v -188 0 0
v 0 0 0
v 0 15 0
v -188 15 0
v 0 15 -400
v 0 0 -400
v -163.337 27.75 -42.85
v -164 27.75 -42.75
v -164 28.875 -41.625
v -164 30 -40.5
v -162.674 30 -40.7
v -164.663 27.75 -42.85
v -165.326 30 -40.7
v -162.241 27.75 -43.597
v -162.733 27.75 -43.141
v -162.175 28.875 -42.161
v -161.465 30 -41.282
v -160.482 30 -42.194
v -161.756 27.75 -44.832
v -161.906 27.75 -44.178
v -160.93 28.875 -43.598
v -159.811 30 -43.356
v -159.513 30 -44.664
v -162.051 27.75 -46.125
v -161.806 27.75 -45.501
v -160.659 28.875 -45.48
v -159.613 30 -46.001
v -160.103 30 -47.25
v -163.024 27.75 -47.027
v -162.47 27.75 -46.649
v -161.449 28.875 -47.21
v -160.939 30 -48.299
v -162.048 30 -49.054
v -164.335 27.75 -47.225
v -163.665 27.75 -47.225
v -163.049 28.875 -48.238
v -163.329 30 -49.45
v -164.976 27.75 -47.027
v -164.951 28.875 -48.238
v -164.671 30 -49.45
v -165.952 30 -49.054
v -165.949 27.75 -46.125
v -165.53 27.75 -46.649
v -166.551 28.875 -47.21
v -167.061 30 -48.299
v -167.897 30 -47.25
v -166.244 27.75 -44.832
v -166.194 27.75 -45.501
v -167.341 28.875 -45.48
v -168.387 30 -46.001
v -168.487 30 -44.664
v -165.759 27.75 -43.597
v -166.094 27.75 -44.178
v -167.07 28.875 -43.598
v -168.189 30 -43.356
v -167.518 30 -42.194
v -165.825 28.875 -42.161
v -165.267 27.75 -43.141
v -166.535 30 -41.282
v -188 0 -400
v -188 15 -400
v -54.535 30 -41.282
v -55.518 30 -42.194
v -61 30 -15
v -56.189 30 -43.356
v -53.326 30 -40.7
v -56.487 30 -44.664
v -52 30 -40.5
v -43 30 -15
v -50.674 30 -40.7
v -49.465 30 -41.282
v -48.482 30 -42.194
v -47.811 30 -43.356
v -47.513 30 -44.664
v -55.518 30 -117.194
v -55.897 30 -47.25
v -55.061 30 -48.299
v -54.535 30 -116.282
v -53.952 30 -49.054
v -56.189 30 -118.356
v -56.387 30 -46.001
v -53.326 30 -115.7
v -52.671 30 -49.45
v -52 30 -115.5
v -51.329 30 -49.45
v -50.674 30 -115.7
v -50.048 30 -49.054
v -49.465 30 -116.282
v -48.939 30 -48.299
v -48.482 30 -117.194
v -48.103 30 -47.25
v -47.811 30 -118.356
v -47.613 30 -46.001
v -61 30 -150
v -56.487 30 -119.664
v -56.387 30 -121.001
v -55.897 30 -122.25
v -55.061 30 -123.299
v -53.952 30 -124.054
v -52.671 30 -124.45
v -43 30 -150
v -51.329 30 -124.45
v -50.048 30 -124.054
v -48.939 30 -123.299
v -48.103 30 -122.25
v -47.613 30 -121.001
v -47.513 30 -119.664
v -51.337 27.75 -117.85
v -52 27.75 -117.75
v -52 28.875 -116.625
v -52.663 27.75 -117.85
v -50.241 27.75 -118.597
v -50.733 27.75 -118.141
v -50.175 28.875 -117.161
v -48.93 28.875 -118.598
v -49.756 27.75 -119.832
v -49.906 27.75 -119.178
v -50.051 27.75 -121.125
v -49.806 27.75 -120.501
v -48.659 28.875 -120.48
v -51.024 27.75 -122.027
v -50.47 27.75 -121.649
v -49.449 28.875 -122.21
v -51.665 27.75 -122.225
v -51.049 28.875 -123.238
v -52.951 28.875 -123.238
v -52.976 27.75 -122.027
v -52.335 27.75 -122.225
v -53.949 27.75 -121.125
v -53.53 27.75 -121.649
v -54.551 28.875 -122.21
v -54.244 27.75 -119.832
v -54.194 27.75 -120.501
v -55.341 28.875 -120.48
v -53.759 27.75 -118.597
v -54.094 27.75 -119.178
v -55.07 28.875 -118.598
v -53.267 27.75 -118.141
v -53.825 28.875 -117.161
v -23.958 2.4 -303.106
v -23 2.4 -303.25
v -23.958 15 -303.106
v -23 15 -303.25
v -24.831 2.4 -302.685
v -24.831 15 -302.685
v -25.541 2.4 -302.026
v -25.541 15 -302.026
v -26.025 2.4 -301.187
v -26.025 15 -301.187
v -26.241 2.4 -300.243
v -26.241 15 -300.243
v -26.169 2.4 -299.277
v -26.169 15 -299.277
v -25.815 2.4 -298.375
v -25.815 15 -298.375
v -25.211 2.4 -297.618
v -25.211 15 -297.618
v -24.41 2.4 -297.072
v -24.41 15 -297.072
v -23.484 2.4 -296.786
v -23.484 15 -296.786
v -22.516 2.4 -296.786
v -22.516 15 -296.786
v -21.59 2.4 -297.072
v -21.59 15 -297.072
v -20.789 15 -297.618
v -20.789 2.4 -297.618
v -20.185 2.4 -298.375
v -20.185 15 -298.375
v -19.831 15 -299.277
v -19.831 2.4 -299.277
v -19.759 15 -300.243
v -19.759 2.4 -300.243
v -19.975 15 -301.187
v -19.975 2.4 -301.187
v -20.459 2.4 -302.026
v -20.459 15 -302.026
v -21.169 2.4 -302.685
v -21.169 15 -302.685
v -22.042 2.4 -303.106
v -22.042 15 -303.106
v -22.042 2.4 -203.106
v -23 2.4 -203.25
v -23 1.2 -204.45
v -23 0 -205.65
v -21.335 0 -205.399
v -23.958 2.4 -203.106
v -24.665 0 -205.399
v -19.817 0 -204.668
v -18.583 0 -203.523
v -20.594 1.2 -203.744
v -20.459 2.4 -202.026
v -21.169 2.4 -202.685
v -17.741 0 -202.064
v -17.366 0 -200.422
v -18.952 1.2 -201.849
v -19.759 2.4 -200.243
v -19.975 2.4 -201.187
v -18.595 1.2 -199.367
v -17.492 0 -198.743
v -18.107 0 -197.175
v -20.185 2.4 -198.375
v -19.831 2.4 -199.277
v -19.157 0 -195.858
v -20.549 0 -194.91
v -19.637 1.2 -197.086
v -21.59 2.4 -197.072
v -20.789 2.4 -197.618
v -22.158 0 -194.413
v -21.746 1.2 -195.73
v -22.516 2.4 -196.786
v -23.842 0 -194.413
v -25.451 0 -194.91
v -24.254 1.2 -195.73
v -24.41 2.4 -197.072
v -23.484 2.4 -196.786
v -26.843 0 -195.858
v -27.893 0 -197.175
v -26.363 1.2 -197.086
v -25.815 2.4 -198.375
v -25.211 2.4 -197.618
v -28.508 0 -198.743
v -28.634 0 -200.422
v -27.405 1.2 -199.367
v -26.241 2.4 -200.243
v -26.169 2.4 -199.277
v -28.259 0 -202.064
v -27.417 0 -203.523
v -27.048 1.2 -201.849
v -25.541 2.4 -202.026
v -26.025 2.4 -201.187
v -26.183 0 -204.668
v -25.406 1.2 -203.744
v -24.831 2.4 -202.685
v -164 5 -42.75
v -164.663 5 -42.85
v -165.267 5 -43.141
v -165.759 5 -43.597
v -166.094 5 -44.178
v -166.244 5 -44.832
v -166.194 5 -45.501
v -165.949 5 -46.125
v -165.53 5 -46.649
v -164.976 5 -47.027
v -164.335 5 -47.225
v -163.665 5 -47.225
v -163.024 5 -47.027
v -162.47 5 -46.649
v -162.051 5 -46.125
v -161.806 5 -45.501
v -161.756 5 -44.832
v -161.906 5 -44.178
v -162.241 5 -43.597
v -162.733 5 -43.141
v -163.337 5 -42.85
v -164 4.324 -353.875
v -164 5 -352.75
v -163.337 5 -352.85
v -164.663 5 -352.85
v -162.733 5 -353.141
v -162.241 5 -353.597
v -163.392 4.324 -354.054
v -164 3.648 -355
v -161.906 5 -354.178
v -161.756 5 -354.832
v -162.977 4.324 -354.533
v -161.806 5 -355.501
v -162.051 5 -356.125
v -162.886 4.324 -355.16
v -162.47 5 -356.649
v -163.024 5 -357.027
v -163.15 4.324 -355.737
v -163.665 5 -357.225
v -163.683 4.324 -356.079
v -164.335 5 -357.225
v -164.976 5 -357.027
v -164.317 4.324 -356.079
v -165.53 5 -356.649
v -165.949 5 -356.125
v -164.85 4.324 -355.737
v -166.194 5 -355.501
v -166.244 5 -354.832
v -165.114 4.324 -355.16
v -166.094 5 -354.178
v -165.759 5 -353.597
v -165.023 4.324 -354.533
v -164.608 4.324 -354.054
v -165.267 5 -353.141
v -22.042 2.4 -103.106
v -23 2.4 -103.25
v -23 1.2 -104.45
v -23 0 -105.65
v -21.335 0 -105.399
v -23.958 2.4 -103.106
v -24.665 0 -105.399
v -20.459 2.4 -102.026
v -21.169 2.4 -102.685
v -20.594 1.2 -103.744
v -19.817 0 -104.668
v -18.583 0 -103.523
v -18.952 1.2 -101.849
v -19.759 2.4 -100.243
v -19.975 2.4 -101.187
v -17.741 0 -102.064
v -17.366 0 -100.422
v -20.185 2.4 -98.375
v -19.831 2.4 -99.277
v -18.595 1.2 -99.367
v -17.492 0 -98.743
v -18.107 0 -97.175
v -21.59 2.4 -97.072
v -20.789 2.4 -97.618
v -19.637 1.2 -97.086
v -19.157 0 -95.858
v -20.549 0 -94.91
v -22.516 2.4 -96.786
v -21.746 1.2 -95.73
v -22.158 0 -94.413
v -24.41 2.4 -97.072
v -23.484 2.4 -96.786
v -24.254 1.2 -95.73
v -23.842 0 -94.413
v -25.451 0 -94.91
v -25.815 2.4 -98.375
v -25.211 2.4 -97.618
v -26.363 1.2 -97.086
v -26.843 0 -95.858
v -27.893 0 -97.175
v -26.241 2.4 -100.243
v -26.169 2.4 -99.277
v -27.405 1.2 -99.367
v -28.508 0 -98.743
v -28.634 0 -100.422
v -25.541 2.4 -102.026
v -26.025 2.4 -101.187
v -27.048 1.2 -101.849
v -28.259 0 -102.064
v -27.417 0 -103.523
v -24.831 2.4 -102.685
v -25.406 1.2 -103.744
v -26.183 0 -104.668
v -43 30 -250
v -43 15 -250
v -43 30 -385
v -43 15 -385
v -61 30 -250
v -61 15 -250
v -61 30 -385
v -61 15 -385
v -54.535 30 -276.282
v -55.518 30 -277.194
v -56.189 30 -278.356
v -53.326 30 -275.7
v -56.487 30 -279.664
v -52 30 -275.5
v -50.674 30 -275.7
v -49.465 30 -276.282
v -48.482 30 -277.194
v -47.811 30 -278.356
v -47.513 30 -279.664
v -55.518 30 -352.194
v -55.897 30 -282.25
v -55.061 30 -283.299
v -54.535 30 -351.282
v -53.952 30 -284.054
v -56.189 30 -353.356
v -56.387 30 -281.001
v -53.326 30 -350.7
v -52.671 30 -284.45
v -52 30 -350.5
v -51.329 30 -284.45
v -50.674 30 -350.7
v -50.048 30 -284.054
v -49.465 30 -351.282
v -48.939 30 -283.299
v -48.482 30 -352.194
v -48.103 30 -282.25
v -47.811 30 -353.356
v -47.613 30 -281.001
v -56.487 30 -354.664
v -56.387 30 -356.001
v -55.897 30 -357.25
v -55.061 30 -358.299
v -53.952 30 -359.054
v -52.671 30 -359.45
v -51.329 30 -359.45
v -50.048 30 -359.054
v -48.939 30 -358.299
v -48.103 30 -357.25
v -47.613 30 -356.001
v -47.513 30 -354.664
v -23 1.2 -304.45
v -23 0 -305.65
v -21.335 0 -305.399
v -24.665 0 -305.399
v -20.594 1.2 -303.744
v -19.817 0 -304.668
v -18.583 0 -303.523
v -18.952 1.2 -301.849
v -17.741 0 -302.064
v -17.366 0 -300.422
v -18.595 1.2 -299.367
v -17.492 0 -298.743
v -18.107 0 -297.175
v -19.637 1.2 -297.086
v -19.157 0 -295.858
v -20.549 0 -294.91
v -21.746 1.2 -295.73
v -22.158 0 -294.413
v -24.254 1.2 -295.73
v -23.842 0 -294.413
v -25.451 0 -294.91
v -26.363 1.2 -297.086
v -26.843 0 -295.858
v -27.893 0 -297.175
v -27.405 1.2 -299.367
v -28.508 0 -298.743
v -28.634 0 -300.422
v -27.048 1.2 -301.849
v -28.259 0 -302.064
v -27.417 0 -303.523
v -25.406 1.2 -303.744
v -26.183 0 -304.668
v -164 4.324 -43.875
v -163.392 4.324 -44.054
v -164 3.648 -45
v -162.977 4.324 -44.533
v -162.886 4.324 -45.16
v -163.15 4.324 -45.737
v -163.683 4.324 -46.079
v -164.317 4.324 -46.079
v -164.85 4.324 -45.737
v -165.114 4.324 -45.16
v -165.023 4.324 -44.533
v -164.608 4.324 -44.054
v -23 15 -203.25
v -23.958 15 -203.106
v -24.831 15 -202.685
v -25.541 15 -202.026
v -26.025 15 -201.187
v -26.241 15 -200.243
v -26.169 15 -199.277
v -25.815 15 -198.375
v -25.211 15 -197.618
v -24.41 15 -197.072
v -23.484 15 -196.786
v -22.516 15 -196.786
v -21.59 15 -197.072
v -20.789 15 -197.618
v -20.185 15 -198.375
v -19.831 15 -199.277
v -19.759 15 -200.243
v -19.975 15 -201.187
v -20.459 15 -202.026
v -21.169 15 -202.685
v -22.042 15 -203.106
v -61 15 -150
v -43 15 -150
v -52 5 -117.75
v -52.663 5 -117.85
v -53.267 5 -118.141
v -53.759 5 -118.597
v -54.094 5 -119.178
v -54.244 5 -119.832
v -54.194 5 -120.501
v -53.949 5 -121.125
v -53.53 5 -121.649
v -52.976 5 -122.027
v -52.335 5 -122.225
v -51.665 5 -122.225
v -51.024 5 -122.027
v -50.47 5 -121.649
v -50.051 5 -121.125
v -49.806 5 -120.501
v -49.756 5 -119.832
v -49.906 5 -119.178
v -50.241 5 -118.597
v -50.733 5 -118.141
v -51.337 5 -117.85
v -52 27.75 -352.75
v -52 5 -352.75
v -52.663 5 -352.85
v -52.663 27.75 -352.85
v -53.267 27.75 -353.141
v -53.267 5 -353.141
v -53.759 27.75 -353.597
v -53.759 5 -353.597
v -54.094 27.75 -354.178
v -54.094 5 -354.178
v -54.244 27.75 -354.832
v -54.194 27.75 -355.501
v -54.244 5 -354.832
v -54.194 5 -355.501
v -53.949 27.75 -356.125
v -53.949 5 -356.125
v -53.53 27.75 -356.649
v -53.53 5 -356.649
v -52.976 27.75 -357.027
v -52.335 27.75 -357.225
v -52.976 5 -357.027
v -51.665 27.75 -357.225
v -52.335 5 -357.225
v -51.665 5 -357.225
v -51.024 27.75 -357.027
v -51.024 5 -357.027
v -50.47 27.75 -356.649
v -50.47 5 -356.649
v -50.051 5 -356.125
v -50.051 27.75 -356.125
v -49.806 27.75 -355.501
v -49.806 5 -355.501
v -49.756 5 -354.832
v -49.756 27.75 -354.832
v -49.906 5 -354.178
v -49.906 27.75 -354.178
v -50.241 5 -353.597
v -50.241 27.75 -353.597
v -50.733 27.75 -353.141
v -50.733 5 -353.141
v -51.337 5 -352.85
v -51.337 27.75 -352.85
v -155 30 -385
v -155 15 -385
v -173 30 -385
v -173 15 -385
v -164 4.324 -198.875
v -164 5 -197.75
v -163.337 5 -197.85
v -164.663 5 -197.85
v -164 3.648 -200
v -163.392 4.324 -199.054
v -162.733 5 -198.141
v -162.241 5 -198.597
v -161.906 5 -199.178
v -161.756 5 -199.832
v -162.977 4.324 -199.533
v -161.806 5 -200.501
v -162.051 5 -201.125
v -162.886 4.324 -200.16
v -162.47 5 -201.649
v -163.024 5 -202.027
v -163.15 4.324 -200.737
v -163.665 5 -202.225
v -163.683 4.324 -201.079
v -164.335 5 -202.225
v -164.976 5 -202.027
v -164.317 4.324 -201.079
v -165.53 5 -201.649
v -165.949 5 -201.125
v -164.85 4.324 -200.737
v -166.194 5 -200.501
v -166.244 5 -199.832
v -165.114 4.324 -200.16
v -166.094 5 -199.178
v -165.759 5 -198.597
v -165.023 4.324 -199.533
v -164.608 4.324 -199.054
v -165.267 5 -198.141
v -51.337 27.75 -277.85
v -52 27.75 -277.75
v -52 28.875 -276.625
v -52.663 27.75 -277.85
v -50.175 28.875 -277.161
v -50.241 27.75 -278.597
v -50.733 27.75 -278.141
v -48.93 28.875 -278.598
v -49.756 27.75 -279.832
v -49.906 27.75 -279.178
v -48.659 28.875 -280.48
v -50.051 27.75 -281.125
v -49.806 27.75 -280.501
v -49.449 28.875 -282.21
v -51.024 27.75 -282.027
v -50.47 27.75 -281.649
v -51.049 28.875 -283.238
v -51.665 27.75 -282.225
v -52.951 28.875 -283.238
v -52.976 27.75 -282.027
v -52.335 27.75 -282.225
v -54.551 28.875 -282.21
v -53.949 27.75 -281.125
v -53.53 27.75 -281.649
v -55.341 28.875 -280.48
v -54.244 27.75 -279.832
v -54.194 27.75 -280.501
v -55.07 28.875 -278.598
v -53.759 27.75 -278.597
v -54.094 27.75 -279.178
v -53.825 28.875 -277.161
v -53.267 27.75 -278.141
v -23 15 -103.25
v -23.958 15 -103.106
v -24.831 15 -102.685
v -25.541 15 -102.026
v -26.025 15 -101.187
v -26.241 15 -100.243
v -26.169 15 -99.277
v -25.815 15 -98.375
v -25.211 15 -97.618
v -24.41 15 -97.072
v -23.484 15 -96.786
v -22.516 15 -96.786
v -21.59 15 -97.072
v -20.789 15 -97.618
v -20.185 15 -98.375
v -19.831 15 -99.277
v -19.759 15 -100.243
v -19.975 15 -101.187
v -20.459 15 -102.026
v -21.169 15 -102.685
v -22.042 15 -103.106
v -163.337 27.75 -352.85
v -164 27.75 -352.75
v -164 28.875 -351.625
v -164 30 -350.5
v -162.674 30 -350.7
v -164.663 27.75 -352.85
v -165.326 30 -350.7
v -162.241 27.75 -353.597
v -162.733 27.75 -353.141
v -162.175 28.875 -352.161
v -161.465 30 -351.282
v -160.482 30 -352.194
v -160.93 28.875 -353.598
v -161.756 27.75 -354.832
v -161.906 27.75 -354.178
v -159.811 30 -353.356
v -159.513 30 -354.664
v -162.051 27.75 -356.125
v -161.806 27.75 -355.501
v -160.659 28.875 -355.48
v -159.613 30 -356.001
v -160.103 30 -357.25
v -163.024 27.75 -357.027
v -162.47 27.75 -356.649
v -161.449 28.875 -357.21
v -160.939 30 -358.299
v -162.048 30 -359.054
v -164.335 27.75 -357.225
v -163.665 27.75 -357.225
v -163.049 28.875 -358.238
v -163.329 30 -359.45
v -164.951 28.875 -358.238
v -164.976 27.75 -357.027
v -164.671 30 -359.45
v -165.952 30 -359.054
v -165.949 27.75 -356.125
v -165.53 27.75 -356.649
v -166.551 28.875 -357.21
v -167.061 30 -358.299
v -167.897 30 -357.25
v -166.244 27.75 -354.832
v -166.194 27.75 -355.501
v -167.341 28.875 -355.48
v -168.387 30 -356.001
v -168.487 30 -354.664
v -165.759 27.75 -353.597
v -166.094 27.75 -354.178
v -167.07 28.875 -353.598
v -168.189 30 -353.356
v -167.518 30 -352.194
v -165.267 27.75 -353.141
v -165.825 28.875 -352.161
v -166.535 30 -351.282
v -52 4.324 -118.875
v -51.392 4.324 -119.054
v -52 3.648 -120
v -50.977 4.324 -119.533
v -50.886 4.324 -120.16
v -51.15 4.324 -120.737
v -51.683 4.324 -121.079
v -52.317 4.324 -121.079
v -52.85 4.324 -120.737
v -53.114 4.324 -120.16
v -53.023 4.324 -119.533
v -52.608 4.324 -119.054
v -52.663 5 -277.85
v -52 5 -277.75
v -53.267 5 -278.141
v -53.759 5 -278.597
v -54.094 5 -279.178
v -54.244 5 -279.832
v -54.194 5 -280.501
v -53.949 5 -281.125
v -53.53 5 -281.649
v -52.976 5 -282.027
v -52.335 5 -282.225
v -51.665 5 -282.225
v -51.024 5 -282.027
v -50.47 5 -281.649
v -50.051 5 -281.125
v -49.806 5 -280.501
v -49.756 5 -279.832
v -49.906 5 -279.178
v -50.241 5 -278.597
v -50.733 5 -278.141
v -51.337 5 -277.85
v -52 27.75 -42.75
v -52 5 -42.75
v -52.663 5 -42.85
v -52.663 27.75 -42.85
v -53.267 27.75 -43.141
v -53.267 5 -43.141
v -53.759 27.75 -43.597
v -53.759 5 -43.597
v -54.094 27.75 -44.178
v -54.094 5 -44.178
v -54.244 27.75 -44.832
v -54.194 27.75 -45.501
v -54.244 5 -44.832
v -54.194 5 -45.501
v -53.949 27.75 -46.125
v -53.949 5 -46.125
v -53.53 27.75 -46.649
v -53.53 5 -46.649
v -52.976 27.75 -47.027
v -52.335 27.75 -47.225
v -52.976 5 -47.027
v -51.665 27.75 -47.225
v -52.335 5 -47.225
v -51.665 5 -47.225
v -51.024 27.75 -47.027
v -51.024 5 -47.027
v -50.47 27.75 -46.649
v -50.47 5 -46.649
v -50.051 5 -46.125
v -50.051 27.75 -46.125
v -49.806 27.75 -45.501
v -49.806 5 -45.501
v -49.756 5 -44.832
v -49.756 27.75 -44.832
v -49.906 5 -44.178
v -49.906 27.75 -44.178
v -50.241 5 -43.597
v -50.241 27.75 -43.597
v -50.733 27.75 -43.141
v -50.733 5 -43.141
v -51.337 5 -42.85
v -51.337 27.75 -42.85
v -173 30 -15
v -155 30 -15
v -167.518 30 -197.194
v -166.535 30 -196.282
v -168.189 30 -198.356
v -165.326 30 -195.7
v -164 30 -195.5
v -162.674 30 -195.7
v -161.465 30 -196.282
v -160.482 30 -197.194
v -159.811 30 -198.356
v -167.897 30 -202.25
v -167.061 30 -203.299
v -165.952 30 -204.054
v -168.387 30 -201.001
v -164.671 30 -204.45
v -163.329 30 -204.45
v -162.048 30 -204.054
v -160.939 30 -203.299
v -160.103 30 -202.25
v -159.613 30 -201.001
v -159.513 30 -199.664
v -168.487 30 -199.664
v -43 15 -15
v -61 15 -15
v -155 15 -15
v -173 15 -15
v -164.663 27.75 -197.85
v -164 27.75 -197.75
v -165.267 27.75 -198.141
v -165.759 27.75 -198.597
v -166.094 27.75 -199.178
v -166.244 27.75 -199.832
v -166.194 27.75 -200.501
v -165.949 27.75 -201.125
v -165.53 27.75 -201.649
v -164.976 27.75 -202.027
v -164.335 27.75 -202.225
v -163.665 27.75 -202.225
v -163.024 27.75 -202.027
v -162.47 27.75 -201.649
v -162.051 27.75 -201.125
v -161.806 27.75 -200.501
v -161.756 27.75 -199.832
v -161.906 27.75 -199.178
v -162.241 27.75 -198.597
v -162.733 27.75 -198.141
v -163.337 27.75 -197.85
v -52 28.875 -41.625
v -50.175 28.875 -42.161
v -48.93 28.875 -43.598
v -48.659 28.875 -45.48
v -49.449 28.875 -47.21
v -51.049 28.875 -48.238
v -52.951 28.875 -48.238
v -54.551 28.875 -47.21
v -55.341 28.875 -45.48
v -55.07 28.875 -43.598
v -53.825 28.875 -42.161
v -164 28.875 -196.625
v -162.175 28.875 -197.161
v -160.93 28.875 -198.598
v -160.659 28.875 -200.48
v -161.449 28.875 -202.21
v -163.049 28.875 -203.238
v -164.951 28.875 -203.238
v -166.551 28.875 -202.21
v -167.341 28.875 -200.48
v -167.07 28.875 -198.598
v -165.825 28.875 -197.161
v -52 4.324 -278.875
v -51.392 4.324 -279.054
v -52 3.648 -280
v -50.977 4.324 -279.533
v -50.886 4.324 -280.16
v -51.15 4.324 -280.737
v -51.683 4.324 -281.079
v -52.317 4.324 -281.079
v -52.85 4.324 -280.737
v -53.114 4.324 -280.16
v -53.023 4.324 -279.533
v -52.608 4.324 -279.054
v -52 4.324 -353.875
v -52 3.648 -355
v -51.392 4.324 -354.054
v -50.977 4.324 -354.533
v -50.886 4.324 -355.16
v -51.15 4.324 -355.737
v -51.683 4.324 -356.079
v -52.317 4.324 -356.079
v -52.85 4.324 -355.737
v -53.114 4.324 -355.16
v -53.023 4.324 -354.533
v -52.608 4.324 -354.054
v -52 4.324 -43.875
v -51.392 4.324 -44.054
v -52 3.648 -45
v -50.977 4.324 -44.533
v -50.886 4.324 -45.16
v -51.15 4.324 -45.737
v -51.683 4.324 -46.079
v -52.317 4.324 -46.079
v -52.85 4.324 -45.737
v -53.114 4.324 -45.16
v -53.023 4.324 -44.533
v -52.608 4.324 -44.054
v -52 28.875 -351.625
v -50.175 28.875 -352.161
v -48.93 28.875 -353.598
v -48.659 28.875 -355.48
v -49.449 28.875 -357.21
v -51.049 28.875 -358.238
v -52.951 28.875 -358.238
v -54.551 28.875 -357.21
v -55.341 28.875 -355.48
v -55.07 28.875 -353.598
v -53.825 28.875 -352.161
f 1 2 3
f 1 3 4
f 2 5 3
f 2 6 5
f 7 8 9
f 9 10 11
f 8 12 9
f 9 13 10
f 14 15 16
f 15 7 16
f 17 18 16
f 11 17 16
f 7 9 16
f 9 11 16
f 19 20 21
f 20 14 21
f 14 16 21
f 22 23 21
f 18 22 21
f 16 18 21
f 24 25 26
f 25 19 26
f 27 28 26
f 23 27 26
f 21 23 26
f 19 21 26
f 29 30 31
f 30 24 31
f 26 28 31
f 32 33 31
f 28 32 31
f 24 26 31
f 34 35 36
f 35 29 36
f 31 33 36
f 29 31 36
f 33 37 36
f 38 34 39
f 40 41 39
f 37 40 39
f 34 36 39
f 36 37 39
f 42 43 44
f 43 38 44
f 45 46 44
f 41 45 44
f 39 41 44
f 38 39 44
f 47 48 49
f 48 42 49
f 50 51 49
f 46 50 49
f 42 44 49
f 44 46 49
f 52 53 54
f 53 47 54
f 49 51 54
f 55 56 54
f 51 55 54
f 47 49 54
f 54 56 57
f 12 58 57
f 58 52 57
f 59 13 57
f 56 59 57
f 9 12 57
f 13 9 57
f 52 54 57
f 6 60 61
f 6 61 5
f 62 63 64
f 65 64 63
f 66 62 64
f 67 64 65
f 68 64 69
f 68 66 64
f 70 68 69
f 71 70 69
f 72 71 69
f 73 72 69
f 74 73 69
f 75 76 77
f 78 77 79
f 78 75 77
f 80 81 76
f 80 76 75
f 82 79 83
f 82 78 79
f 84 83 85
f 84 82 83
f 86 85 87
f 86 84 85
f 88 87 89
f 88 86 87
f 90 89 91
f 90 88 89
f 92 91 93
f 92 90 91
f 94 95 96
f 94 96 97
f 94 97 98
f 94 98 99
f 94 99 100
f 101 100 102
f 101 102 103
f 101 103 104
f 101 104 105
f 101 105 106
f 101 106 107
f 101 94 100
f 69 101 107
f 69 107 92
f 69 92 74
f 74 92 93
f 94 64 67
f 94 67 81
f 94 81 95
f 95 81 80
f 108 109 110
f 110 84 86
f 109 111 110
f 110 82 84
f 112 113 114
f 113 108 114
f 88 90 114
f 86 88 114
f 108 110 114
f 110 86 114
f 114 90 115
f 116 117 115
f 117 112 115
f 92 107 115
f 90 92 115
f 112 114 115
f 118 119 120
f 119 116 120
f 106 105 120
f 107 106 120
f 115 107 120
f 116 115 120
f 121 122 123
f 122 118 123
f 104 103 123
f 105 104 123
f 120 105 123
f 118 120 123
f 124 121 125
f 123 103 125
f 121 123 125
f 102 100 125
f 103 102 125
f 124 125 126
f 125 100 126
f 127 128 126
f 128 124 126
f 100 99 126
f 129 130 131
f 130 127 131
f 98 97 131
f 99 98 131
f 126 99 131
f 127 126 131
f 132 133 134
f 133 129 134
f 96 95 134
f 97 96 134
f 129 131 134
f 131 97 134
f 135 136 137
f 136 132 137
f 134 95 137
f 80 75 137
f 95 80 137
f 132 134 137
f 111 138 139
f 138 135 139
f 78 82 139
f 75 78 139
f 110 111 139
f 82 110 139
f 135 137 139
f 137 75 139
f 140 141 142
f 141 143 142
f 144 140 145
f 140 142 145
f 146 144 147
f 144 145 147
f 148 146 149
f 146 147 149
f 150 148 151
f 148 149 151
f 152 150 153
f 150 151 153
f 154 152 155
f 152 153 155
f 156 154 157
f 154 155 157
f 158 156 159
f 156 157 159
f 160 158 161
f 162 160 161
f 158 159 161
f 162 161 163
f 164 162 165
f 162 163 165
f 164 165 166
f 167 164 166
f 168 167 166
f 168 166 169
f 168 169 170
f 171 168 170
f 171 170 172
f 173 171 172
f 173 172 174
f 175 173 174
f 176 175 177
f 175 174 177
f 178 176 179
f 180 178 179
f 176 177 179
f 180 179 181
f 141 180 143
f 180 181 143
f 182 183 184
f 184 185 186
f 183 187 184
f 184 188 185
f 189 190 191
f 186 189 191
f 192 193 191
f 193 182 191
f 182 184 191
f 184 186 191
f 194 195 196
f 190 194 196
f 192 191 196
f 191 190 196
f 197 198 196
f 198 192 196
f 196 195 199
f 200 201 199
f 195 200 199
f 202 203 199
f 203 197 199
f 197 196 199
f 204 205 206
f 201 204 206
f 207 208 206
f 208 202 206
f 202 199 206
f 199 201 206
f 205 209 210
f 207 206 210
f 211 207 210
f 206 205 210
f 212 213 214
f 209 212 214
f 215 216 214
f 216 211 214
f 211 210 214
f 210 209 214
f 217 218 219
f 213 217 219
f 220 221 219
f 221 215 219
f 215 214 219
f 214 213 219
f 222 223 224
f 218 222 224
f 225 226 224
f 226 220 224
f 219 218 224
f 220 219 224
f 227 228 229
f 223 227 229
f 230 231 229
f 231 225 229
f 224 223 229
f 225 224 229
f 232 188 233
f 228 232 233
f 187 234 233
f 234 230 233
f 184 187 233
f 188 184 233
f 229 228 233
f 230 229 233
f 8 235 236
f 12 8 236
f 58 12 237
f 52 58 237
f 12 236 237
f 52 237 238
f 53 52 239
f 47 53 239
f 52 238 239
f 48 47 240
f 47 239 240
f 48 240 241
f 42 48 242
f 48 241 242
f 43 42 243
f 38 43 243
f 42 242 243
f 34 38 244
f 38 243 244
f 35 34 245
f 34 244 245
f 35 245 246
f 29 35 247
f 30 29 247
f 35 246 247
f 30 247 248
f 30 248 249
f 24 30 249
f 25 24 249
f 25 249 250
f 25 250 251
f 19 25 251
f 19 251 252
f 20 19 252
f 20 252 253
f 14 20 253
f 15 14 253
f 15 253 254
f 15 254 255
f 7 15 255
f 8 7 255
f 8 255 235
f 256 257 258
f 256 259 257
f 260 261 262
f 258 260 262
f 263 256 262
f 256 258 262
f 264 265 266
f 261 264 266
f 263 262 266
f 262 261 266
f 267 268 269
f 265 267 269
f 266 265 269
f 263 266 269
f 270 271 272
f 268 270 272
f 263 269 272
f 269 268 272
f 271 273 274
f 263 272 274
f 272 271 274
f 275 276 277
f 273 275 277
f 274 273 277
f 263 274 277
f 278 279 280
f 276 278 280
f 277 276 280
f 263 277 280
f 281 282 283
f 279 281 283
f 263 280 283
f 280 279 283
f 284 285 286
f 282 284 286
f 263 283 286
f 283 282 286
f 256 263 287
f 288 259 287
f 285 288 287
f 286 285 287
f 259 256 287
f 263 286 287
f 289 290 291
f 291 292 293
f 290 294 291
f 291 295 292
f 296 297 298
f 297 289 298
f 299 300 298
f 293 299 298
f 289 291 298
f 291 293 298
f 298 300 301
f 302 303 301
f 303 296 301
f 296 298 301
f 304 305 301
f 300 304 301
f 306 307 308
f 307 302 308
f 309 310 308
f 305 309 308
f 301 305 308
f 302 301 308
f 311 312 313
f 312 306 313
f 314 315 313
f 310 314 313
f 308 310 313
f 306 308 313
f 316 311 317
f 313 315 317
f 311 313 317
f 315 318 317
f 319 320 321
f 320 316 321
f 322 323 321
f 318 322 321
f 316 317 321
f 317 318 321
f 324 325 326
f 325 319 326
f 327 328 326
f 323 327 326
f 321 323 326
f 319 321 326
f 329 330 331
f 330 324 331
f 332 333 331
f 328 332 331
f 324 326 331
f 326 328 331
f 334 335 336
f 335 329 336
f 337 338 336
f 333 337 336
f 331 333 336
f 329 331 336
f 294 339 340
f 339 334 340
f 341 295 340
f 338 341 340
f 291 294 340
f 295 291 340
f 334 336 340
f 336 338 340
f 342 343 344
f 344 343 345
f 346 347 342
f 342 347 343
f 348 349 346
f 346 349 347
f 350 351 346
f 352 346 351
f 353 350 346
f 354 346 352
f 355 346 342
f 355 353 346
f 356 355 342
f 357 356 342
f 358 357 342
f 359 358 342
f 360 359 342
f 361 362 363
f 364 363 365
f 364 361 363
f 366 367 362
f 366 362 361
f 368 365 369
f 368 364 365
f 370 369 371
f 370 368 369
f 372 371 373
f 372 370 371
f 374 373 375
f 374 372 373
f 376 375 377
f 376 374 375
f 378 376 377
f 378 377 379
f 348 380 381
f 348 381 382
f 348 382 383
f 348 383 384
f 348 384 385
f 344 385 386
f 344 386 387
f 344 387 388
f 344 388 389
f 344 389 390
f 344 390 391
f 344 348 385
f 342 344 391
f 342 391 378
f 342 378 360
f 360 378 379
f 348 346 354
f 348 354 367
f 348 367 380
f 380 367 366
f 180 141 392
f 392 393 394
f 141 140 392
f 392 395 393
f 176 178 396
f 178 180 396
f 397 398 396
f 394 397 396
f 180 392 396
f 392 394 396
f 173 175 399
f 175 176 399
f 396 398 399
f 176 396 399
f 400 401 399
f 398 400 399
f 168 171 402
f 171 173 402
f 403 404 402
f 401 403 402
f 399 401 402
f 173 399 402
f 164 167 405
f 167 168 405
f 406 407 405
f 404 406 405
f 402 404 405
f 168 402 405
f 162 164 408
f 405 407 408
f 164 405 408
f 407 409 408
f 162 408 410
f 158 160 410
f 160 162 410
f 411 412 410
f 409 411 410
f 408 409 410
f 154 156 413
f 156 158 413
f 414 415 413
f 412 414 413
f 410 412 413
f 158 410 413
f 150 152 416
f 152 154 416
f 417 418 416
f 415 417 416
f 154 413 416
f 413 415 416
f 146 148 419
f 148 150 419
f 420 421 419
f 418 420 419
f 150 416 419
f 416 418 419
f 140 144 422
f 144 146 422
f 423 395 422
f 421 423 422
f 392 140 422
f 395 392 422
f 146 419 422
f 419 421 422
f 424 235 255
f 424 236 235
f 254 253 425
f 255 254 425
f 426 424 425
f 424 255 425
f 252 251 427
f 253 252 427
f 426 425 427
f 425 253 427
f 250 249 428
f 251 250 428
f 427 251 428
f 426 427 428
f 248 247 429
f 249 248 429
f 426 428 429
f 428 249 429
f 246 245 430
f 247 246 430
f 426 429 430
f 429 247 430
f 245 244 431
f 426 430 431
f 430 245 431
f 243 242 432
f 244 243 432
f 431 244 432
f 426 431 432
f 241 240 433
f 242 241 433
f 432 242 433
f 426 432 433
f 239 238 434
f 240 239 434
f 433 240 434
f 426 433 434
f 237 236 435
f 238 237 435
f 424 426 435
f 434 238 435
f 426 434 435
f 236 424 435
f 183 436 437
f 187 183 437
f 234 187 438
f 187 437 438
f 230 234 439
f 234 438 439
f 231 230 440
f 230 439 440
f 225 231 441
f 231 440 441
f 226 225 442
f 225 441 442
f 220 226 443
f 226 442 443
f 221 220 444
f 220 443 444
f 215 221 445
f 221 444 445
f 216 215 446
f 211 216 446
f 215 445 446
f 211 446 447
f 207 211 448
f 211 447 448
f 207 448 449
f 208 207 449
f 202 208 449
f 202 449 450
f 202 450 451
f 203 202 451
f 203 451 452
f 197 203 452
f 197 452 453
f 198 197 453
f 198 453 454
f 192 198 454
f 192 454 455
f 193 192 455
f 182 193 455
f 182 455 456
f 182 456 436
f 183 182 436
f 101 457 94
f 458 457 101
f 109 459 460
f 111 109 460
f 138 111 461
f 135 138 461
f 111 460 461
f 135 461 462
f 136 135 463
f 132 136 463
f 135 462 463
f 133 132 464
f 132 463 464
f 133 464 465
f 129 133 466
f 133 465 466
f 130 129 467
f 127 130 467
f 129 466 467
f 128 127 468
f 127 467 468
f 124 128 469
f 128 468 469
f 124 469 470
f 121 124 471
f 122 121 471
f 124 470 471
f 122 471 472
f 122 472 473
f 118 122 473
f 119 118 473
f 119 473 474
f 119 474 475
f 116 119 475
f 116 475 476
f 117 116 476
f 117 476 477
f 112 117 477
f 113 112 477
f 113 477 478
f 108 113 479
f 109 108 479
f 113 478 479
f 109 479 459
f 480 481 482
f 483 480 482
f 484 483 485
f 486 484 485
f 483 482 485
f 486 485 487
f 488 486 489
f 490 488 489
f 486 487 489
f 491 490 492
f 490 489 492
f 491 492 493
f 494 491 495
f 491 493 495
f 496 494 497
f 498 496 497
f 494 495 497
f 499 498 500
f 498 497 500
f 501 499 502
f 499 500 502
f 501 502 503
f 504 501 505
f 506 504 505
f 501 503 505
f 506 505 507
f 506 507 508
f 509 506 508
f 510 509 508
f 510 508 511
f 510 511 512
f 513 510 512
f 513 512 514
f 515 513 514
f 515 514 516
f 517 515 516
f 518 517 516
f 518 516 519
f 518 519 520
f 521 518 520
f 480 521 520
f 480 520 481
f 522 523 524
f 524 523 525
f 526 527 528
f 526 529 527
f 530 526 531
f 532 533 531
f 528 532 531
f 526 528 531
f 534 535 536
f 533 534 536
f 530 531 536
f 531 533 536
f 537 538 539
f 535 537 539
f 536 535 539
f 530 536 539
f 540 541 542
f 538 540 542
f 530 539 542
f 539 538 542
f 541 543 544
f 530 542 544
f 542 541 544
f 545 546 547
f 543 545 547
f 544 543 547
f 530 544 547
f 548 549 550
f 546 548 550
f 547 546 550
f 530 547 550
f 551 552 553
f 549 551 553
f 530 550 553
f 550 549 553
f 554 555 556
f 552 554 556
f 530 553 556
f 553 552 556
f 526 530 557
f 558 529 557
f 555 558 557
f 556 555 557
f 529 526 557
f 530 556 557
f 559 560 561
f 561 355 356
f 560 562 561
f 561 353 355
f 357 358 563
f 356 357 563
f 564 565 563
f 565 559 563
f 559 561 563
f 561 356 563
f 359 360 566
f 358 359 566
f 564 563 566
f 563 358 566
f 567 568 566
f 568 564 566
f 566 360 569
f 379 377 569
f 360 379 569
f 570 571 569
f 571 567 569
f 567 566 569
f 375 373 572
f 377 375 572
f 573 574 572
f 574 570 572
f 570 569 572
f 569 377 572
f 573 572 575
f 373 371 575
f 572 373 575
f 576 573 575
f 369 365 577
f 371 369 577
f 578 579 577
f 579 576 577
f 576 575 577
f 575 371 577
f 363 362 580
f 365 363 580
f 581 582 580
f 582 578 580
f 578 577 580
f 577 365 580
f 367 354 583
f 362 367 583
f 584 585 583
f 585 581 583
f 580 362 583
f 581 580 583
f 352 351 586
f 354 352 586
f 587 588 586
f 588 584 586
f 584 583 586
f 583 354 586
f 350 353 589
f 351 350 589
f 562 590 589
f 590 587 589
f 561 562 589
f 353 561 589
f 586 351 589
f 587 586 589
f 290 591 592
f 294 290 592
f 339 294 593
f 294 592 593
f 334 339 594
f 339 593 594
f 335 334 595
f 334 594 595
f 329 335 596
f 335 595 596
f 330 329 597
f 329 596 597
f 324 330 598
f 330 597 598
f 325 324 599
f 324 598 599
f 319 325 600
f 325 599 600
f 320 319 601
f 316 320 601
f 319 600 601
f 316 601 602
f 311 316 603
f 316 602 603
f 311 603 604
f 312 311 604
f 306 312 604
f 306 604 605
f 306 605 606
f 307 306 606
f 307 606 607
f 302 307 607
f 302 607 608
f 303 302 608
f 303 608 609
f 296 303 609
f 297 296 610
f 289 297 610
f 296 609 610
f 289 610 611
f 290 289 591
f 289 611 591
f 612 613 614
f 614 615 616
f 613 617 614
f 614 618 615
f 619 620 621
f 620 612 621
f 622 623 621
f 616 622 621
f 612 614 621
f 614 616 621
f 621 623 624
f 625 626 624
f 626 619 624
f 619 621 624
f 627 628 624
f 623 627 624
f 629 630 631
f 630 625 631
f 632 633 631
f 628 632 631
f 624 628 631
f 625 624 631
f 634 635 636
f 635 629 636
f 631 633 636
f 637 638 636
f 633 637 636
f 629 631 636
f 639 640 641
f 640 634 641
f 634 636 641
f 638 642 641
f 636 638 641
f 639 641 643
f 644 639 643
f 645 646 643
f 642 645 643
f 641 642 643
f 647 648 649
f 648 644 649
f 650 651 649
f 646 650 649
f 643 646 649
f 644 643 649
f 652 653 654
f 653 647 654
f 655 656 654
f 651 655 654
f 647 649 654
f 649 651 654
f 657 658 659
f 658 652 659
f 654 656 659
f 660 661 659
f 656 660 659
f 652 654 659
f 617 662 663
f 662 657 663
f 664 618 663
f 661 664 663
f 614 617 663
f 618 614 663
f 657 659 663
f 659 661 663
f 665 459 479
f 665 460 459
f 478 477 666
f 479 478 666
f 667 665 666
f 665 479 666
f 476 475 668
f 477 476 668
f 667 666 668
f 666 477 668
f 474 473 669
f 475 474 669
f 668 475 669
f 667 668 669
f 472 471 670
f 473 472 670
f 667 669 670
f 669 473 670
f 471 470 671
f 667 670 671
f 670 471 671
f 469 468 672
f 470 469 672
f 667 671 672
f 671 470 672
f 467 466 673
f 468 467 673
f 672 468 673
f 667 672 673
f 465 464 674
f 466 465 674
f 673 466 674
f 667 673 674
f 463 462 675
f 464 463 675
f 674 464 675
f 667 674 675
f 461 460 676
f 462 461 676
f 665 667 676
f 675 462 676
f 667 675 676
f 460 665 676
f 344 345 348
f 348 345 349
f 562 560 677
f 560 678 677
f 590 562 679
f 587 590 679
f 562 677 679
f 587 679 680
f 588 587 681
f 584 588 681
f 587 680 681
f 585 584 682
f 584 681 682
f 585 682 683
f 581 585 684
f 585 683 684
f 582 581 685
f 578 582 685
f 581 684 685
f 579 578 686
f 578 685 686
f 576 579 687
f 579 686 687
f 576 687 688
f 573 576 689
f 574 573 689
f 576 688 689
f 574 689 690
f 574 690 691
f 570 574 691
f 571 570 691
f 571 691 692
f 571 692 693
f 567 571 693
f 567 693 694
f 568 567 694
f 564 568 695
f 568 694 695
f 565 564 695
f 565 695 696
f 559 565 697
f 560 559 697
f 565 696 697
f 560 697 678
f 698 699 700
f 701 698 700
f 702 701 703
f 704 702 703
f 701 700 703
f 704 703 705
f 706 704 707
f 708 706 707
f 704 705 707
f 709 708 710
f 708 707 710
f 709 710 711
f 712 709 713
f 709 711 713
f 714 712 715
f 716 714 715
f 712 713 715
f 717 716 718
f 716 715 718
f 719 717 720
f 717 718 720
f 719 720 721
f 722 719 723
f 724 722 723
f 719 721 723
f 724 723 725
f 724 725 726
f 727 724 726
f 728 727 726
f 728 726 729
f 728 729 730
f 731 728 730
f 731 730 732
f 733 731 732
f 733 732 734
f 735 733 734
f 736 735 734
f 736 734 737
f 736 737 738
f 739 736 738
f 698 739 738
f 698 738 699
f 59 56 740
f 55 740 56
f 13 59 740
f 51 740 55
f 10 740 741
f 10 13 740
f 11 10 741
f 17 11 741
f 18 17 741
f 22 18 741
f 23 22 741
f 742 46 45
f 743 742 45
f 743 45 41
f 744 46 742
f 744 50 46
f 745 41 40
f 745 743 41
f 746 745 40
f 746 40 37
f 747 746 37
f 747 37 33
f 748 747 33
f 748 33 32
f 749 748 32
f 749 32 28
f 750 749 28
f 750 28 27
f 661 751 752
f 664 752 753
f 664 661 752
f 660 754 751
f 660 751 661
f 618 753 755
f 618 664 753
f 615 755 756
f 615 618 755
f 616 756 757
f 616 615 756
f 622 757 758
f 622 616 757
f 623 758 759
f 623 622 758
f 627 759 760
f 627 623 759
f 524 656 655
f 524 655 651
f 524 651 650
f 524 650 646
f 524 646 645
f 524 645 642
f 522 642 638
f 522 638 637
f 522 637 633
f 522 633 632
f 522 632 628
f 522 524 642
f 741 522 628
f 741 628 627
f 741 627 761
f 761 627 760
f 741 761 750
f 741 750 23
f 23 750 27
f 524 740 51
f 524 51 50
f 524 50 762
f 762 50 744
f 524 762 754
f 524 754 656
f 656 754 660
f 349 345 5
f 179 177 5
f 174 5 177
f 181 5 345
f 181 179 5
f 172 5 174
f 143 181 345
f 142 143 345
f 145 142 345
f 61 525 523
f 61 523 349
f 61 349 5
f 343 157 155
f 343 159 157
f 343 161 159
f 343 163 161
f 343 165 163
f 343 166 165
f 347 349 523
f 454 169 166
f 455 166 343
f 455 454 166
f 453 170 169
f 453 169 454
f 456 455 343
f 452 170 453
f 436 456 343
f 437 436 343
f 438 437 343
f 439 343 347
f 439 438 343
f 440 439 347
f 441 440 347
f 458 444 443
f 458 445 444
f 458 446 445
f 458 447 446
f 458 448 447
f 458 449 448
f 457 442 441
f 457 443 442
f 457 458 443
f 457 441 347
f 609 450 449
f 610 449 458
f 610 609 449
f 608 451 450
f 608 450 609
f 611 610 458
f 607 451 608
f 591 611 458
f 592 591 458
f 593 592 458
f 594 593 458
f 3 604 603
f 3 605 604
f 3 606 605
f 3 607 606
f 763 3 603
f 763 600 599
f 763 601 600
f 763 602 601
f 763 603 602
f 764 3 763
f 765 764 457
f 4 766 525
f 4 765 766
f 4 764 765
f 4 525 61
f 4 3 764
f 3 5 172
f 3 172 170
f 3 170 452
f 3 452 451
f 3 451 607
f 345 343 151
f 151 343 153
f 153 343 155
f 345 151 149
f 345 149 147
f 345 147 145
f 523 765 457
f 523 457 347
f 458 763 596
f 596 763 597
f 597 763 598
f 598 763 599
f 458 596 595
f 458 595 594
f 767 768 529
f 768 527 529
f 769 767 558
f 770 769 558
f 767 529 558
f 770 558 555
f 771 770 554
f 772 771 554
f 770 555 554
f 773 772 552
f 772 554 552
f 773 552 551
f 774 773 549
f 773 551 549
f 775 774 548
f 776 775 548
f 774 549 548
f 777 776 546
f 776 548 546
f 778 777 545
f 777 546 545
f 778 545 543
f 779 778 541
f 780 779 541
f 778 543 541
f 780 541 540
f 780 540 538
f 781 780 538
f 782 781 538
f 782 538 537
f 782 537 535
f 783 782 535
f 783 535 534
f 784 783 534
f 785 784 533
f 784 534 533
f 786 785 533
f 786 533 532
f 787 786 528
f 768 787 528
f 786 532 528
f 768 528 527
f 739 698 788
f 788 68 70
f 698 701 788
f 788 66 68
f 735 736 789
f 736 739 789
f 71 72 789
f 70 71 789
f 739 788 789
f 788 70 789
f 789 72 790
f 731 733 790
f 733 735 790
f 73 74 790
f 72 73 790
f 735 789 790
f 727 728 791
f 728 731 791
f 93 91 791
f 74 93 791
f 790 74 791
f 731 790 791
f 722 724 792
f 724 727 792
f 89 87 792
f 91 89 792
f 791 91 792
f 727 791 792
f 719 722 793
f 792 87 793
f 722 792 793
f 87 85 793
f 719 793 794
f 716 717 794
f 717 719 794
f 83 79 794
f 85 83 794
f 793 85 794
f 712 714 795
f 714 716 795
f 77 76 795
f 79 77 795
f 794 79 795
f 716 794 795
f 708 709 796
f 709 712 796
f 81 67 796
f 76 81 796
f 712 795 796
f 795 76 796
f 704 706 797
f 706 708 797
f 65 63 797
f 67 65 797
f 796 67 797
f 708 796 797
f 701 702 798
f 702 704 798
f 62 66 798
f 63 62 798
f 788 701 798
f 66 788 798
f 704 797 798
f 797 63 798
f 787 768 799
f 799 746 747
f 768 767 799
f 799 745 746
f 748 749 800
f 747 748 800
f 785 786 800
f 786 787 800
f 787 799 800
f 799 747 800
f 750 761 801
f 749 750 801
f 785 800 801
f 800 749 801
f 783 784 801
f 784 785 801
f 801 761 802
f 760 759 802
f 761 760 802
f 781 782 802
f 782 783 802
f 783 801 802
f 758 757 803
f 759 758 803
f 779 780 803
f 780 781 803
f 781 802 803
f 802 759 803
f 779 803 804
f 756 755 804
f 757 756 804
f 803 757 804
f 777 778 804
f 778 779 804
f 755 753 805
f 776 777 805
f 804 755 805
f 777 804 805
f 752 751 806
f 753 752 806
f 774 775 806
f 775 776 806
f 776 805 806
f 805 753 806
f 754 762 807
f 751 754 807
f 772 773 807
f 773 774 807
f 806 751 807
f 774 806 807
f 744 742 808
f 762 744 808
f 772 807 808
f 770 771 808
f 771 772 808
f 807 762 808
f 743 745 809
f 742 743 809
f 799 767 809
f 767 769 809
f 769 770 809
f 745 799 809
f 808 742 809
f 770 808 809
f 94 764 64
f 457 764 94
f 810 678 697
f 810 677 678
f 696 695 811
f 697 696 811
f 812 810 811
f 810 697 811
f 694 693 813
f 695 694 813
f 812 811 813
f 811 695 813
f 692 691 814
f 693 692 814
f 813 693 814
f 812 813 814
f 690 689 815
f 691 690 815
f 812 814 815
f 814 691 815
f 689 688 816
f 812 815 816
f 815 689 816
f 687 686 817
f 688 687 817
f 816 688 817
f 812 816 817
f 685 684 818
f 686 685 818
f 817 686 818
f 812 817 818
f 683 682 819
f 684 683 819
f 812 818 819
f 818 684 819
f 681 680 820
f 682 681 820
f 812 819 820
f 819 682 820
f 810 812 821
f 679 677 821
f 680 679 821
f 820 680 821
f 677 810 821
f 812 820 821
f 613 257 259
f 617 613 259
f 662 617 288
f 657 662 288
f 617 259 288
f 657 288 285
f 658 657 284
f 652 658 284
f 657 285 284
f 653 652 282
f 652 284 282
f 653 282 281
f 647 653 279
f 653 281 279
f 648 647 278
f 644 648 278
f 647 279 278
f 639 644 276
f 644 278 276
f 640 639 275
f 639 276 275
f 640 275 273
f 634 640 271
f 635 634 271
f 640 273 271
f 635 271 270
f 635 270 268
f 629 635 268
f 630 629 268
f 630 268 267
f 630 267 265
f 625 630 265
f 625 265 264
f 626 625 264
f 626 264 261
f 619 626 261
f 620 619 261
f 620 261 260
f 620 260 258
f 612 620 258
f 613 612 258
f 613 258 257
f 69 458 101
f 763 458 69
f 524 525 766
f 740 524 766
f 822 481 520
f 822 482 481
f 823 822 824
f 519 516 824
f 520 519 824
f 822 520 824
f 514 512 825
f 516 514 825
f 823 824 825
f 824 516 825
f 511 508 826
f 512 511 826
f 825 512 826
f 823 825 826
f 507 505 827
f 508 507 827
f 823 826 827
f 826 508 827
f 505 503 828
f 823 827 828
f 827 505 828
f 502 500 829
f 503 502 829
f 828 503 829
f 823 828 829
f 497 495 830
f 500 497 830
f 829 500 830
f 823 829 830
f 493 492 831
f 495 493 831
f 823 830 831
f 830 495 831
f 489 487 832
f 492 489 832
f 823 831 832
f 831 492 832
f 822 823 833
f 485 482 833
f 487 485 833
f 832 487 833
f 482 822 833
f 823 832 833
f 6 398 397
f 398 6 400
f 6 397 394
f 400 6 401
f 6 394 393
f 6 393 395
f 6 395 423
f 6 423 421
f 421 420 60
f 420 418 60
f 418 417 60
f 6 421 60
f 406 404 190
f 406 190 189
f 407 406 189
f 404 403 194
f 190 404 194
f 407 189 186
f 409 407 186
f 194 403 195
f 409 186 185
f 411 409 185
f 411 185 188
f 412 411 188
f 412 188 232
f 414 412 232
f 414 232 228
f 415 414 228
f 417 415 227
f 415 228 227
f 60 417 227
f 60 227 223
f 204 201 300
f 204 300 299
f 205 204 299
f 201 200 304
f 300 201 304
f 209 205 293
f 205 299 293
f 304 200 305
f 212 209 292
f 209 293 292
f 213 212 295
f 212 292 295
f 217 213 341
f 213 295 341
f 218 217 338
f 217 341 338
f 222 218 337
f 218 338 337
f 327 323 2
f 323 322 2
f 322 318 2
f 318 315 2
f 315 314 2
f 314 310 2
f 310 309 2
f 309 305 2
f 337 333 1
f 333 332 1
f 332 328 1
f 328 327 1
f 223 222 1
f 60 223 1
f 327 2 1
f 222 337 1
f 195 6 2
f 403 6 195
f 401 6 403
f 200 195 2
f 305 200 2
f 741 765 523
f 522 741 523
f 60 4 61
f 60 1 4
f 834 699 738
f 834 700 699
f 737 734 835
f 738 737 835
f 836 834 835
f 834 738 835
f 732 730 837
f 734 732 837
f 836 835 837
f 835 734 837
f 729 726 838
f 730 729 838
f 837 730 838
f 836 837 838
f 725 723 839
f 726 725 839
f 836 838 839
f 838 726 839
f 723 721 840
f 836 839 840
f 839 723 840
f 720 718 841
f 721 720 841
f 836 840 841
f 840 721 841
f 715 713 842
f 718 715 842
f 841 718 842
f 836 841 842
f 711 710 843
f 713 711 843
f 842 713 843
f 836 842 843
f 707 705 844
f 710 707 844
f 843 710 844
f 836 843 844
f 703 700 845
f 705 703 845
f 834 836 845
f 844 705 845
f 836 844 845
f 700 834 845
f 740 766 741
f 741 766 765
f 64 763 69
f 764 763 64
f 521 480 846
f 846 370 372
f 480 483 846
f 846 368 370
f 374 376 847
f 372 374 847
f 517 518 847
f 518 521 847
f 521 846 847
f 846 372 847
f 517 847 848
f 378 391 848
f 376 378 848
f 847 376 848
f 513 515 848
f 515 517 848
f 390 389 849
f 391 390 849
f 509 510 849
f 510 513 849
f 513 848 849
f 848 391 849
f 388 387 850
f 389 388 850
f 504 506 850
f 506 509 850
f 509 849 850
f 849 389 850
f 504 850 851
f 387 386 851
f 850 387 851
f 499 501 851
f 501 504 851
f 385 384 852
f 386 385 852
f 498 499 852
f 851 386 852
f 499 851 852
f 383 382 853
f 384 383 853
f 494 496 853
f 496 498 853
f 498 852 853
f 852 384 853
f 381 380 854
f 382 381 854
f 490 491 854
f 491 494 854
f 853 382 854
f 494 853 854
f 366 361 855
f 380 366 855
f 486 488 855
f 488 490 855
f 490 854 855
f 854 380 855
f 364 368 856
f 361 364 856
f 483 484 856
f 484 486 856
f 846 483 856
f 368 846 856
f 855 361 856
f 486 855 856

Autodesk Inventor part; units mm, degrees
ref_plane "YZ Plane" through (0, 0, 0) normal (1, 0, 0) x (0, 1, 0)
ref_plane "XZ Plane" through (0, 0, 0) normal (0, 1, 0) x (-1, 0, 0)
ref_plane "XY Plane" through (0, 0, 0) normal (0, 0, 1) x (1, 0, 0)
sketch "Skizze1" plane through (0, 0, 0) normal (0, 1, 0) x (-1, 0, 0)
  line L0 (0, 0) -> (188, 0)
  line L1 (188, 0) -> (188, -400)
  line L2 (188, -400) -> (0, -400)
  line L3 (0, -400) -> (0, 0)
  dimension "d1" = 188
  dimension "d2" = 400
extrude "Extrusion1" add sketch "Skizze1" along normal blind 15
sketch "Skizze2" plane through (0, 15, 0) normal (0, 1, 0) x (1, 0, 0)
  line L0 (-173, 15) -> (-155, 15)
  line L1 (-155, 15) -> (-155, 385)
  line L2 (-155, 385) -> (-173, 385)
  line L3 (-173, 385) -> (-173, 15)
  line L4 (-43, 15) -> (-61, 15)
  line L5 (-61, 15) -> (-61, 150)
  line L6 (-61, 150) -> (-43, 150)
  line L7 (-43, 150) -> (-43, 15)
  line L8 (-43, 385) -> (-61, 385)
  line L9 (-61, 385) -> (-61, 250)
  line L10 (-61, 250) -> (-43, 250)
  line L11 (-43, 250) -> (-43, 385)
  line L12 (-188, 0) -> (0, 0) projected
  line L13 (0, 0) -> (0, 400) projected
  dimension "d5" = 18
  dimension "d6" = 370
  dimension "d7" = 18
  dimension "d8" = 135
  dimension "d9" = 135
  dimension "d10" = 18
  dimension "d11" = 15
  dimension "d12" = 150
  dimension "d13" = 250
  dimension "d14" = 43
  dimension "d15" = 155
  dimension "d16" = 43
extrude "Extrusion2" add sketch "Skizze2" along normal blind 15
sketch "Skizze3" plane through (0, 30, 0) normal (0, 1, 0) x (1, 0, 0)
  point P0 (0, 0)
  point P1 (-52, 45)
  point P2 (-52, 120)
  point P3 (-52, 280)
  point P4 (-52, 355)
  point P5 (-164, 355)
  point P6 (-164, 200)
  point P7 (-164, 45)
hole "Bohrung1" at (-52, 30, -45) at (-52, 30, -120) at (-52, 30, -280) at (-52, 30, -355) at (-164, 30, -355) at (-164, 30, -200) at (-164, 30, -45) direction (0, -1, 0) diameter 4.5 depth 25 tip angle 118 countersink diameter 9 countersink angle 90
sketch "Skizze4" plane through (0, 0, 0) normal (0, -1, 0) x (1, 0, 0)
  line L0 (0, 0) -> (-188, 0) projected
  line L1 (0, -400) -> (0, 0) projected
  point P0 (-23, -200)
  point P1 (-23, -100)
  point P2 (-23, -300)
  dimension "d26" = 100
  dimension "d27" = 200
  dimension "d28" = 300
  dimension "d29" = 23
  dimension "d30" = 23
  dimension "d31" = 23
hole "Bohrung2" at (-23, 0, -100) at (-23, 0, -200) at (-23, 0, -300) direction (0, 1, 0) diameter 6.5 end through all countersink diameter 11.3 countersink angle 90
properties part number "frontHolz" material "Pappel"
